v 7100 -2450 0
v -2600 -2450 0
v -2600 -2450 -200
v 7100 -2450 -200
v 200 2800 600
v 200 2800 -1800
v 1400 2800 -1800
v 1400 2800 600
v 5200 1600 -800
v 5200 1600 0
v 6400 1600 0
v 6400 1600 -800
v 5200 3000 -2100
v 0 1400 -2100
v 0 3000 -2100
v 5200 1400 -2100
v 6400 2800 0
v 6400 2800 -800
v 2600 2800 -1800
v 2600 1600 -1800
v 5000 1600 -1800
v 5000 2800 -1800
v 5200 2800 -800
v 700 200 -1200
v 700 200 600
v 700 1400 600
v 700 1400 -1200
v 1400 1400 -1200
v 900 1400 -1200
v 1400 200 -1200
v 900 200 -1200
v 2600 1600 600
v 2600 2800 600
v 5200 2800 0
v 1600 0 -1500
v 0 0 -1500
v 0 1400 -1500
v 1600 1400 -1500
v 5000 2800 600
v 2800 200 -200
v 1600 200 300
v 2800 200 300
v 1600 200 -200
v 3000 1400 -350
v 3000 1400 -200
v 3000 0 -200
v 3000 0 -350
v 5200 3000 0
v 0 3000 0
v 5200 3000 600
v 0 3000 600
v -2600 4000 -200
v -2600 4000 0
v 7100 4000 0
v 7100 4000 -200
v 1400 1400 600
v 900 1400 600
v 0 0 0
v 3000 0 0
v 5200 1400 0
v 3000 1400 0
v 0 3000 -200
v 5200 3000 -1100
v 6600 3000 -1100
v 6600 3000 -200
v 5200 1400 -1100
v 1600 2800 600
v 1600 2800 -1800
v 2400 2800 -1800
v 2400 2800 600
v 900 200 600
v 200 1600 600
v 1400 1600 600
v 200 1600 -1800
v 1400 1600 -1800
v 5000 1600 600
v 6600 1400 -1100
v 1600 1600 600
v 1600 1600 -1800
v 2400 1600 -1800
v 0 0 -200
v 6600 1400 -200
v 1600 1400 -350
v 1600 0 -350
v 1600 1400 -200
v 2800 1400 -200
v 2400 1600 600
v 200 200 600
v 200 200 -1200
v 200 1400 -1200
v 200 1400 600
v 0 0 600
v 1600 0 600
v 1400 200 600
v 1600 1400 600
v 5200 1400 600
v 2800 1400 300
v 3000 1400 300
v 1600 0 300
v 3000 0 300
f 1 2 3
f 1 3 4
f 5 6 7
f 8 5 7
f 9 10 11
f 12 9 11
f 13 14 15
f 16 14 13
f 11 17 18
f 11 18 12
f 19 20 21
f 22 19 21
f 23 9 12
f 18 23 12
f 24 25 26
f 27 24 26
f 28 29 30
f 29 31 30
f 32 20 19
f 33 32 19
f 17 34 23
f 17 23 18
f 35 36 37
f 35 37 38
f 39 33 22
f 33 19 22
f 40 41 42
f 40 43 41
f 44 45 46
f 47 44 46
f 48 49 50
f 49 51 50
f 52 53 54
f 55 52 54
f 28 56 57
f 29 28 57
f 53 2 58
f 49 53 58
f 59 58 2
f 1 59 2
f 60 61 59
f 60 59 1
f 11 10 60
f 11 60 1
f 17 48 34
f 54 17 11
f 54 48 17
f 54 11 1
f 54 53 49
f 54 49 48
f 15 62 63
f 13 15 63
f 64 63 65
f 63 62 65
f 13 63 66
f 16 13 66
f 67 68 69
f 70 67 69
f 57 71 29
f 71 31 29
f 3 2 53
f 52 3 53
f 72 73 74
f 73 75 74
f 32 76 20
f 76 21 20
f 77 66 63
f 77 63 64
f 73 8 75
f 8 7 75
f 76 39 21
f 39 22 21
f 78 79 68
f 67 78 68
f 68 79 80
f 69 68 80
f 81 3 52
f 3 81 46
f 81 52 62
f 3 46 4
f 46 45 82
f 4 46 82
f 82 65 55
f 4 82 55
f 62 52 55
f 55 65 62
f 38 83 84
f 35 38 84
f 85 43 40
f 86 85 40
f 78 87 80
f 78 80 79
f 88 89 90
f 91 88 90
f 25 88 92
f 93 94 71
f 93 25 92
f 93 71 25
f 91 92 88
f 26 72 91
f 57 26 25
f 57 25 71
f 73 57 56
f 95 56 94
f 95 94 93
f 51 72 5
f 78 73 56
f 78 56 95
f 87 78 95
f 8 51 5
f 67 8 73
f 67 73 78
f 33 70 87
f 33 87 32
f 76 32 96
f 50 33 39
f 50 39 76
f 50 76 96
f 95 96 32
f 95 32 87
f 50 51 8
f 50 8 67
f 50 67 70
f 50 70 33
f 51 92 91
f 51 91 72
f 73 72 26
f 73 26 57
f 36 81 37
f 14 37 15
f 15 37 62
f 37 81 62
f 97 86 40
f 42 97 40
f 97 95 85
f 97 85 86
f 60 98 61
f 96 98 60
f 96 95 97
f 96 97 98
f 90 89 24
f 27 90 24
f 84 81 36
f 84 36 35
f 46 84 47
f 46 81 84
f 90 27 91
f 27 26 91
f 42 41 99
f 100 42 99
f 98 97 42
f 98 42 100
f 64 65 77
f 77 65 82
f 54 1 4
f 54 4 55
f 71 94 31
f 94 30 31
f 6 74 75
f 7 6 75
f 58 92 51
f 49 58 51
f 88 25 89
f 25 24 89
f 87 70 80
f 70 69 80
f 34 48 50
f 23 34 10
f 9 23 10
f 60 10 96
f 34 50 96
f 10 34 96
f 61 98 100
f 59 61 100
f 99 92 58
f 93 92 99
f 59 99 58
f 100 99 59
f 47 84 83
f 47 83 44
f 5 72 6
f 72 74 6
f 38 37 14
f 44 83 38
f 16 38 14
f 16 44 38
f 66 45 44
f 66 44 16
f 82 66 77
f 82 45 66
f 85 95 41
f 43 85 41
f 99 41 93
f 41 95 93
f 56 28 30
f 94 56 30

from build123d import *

# Parameters (mm, degrees)
F0_W      = 200
F0_H      = 200
F0_H_2    = 1200
F0_W_2    = 500
F0_W_3    = 1200
F1_DEPTH  = 1800
F2_DEPTH  = 600
F4_DEPTH  = 300
F0_W_4    = 800
F5_DEPTH  = 1800
F6_DEPTH  = 600
F7_DEPTH  = 300
F0_W_5    = 2400
F8_DEPTH  = 1800
F9_DEPTH  = 600
F10_DEPTH = 300
F11_DEPTH = 1200
F12_DEPTH = 600
F14_DEPTH = 300
F15_DEPTH = 200
F16_DEPTH = 300
F17_W     = 1400
F17_H     = 1400
F18_DEPTH = 150
F19_DEPTH = 800
F20_W     = 1400
F20_H     = 1600
F21_DEPTH = 300
F22_W     = 9700
F22_H     = 6450
F23_DEPTH = 200


with BuildPart() as f1:
    # F0 (on Top) → F1 (new body)
    with BuildSketch(Plane.XY):
        with Locations((100, 2900)):
            Rectangle(F0_W, F0_H)
        with Locations((100, 2200)):
            Rectangle(F0_W, F0_H_2)
        with Locations((100, 1500)):
            Rectangle(F0_W, F0_H)
        with Locations((450, 1500)):
            Rectangle(F0_W_2, F0_H)
        with Locations((800, 1500)):
            Rectangle(F0_W, F0_H)
        with Locations((1150, 1500)):
            Rectangle(F0_W_2, F0_H)
        with Locations((1500, 1500)):
            Rectangle(F0_W, F0_H)
        with Locations((1500, 2200)):
            Rectangle(F0_W, F0_H_2)
        with Locations((1500, 2900)):
            Rectangle(F0_W, F0_H)
        with Locations((800, 2900)):
            Rectangle(F0_W_3, F0_H)
    extrude(amount=-F1_DEPTH)

    # F0 (on Top) → F2 (join)
    with BuildSketch(Plane.XY):
        with Locations((100, 1500)):
            Rectangle(F0_W, F0_H)
        with Locations((450, 1500)):
            Rectangle(F0_W_2, F0_H)
        with Locations((800, 1500)):
            Rectangle(F0_W, F0_H)
        with Locations((1150, 1500)):
            Rectangle(F0_W_2, F0_H)
        with Locations((1500, 1500)):
            Rectangle(F0_W, F0_H)
        with Locations((1500, 2200)):
            Rectangle(F0_W, F0_H_2)
        with Locations((1500, 2900)):
            Rectangle(F0_W, F0_H)
        with Locations((800, 2900)):
            Rectangle(F0_W_3, F0_H)
        with Locations((100, 2900)):
            Rectangle(F0_W, F0_H)
        with Locations((100, 2200)):
            Rectangle(F0_W, F0_H_2)
    extrude(amount=F2_DEPTH)

    # F3 (on face) → F4 (join)
    with BuildSketch(Plane(origin=(0, 0, -1800), x_dir=(1, 0, 0), z_dir=(0, 0, -1))):
        Polygon((1400, -1400), (200, -1400), (0, -1400), (0, -3000), (1400, -3000), align=None)
        Polygon((1400, -1400), (200, -1400), (0, -1400), (0, -3000), (1400, -3000), (1400, -2800), align=None)
        Polygon((2600, -1400), (1600, -1400), (1600, -3000), (2600, -3000), (2600, -2800), (2600, -1600), align=None)
    extrude(amount=F4_DEPTH)

    # F0 (on Top) → F5 (join)
    with BuildSketch(Plane.XY):
        with Locations((2000, 1500)):
            Rectangle(F0_W_4, F0_H)
        with Locations((2500, 1500)):
            Rectangle(F0_W, F0_H)
        with Locations((2500, 2200)):
            Rectangle(F0_W, F0_H_2)
        with Locations((2500, 2900)):
            Rectangle(F0_W, F0_H)
        with Locations((2000, 2900)):
            Rectangle(F0_W_4, F0_H)
    extrude(amount=-F5_DEPTH)

    # F0 (on Top) → F6 (join)
    with BuildSketch(Plane.XY):
        with Locations((2000, 2900)):
            Rectangle(F0_W_4, F0_H)
        with Locations((2500, 2900)):
            Rectangle(F0_W, F0_H)
        with Locations((2500, 2200)):
            Rectangle(F0_W, F0_H_2)
        with Locations((2500, 1500)):
            Rectangle(F0_W, F0_H)
        with Locations((2000, 1500)):
            Rectangle(F0_W_4, F0_H)
    extrude(amount=F6_DEPTH)

    # F3 (on face) → F7 (join)
    with BuildSketch(Plane(origin=(0, 0, -1800), x_dir=(1, 0, 0), z_dir=(0, 0, -1))):
        Polygon((1600, -1400), (1400, -1400), (1400, -2800), (1400, -3000), (1600, -3000), align=None)
    extrude(amount=F7_DEPTH)

    # F0 (on Top) → F8 (join)
    with BuildSketch(Plane.XY):
        with Locations((3800, 2900)):
            Rectangle(F0_W_5, F0_H)
        with Locations((5100, 2900)):
            Rectangle(F0_W, F0_H)
        with Locations((5100, 2200)):
            Rectangle(F0_W, F0_H_2)
        with Locations((5100, 1500)):
            Rectangle(F0_W, F0_H)
        Polygon((2600, 1400), (2800, 1400), (3000, 1400), (5000, 1400), (5000, 1600), (2600, 1600), align=None)
    extrude(amount=-F8_DEPTH)

    # F0 (on Top) → F9 (join)
    with BuildSketch(Plane.XY):
        Polygon((2600, 1400), (2800, 1400), (3000, 1400), (5000, 1400), (5000, 1600), (2600, 1600), align=None)
        with Locations((5100, 1500)):
            Rectangle(F0_W, F0_H)
        with Locations((5100, 2200)):
            Rectangle(F0_W, F0_H_2)
        with Locations((5100, 2900)):
            Rectangle(F0_W, F0_H)
        with Locations((3800, 2900)):
            Rectangle(F0_W_5, F0_H)
    extrude(amount=F9_DEPTH)

    # F3 (on face) → F10 (join)
    with BuildSketch(Plane(origin=(0, 0, -1800), x_dir=(1, 0, 0), z_dir=(0, 0, -1))):
        Polygon((5200, -1400), (2600, -1400), (2600, -1600), (2600, -2800), (2600, -3000), (5200, -3000), align=None)
    extrude(amount=F10_DEPTH)

    # F0 (on Top) → F11 (join)
    with BuildSketch(Plane.XY):
        with Locations((100, 800)):
            Rectangle(F0_W, F0_H_2)
        with Locations((100, 100)):
            Rectangle(F0_W, F0_H)
        with Locations((450, 100)):
            Rectangle(F0_W_2, F0_H)
        with Locations((800, 100)):
            Rectangle(F0_W, F0_H)
        with Locations((800, 800)):
            Rectangle(F0_W, F0_H_2)
        with Locations((1150, 100)):
            Rectangle(F0_W_2, F0_H)
        with Locations((1500, 100)):
            Rectangle(F0_W, F0_H)
        with Locations((1500, 800)):
            Rectangle(F0_W, F0_H_2)
    extrude(amount=-F11_DEPTH)

    # F0 (on Top) → F12 (join)
    with BuildSketch(Plane.XY):
        with Locations((1500, 800)):
            Rectangle(F0_W, F0_H_2)
        with Locations((1500, 100)):
            Rectangle(F0_W, F0_H)
        with Locations((1150, 100)):
            Rectangle(F0_W_2, F0_H)
        with Locations((800, 100)):
            Rectangle(F0_W, F0_H)
        with Locations((800, 800)):
            Rectangle(F0_W, F0_H_2)
        with Locations((450, 100)):
            Rectangle(F0_W_2, F0_H)
        with Locations((100, 100)):
            Rectangle(F0_W, F0_H)
        with Locations((100, 800)):
            Rectangle(F0_W, F0_H_2)
    extrude(amount=F12_DEPTH)

    # F13 (on face) → F14 (join)
    with BuildSketch(Plane(origin=(0, 0, -1200), x_dir=(1, 0, 0), z_dir=(0, 0, -1))):
        Polygon((1600, 0), (0, 0), (0, -1400), (1600, -1400), (1600, -200), align=None)
    extrude(amount=F14_DEPTH)



with BuildPart() as f15:
    # F0 (on Top) → F15 (new body)
    with BuildSketch(Plane.XY):
        with Locations((2900, 800)):
            Rectangle(F0_W, F0_H_2)
        with Locations((2900, 100)):
            Rectangle(F0_W, F0_H)
        with Locations((2200, 100)):
            Rectangle(F0_W_3, F0_H)
    extrude(amount=-F15_DEPTH)


with BuildPart() as f1_1:
    add(f1.part)

    add(f15.part)  # F16 merges F15
    # F0 (on Top) → F16 (join)
    with BuildSketch(Plane.XY):
        with Locations((2900, 800)):
            Rectangle(F0_W, F0_H_2)
        with Locations((2900, 100)):
            Rectangle(F0_W, F0_H)
        with Locations((2200, 100)):
            Rectangle(F0_W_3, F0_H)
    extrude(amount=F16_DEPTH)

    # F17 (on face) → F18 (join)
    with BuildSketch(Plane(origin=(0, 0, -200), x_dir=(1, 0, 0), z_dir=(0, 0, -1))):
        with Locations((2300, -700)):
            Rectangle(F17_W, F17_H)
    extrude(amount=F18_DEPTH)

    # F0 (on Top) → F19 (join)
    with BuildSketch(Plane.XY):
        with Locations((5800, 2900)):
            Rectangle(F0_W_3, F0_H)
        with Locations((6500, 2900)):
            Rectangle(F0_W, F0_H)
        with Locations((6500, 2200)):
            Rectangle(F0_W, F0_H_2)
        with Locations((6500, 1500)):
            Rectangle(F0_W, F0_H)
        with Locations((5800, 1500)):
            Rectangle(F0_W_3, F0_H)
    extrude(amount=-F19_DEPTH)

    # F20 (on face) → F21 (join)
    with BuildSketch(Plane(origin=(0, 0, -800), x_dir=(1, 0, 0), z_dir=(0, 0, -1))):
        with Locations((5900, -2200)):
            Rectangle(F20_W, F20_H)
    extrude(amount=F21_DEPTH)

    # F22 (on Top) → F23 (join)
    with BuildSketch(Plane.XY):
        with Locations((2250, 775)):
            Rectangle(F22_W, F22_H)
        Polygon((1600, 0), (0, 0), (0, 3000), (5200, 3000), (6600, 3000), (6600, 1400), (5200, 1400), (3000, 1400), (3000, 0), align=None, mode=Mode.SUBTRACT)
    extrude(amount=-F23_DEPTH)


solid = f1_1.part
